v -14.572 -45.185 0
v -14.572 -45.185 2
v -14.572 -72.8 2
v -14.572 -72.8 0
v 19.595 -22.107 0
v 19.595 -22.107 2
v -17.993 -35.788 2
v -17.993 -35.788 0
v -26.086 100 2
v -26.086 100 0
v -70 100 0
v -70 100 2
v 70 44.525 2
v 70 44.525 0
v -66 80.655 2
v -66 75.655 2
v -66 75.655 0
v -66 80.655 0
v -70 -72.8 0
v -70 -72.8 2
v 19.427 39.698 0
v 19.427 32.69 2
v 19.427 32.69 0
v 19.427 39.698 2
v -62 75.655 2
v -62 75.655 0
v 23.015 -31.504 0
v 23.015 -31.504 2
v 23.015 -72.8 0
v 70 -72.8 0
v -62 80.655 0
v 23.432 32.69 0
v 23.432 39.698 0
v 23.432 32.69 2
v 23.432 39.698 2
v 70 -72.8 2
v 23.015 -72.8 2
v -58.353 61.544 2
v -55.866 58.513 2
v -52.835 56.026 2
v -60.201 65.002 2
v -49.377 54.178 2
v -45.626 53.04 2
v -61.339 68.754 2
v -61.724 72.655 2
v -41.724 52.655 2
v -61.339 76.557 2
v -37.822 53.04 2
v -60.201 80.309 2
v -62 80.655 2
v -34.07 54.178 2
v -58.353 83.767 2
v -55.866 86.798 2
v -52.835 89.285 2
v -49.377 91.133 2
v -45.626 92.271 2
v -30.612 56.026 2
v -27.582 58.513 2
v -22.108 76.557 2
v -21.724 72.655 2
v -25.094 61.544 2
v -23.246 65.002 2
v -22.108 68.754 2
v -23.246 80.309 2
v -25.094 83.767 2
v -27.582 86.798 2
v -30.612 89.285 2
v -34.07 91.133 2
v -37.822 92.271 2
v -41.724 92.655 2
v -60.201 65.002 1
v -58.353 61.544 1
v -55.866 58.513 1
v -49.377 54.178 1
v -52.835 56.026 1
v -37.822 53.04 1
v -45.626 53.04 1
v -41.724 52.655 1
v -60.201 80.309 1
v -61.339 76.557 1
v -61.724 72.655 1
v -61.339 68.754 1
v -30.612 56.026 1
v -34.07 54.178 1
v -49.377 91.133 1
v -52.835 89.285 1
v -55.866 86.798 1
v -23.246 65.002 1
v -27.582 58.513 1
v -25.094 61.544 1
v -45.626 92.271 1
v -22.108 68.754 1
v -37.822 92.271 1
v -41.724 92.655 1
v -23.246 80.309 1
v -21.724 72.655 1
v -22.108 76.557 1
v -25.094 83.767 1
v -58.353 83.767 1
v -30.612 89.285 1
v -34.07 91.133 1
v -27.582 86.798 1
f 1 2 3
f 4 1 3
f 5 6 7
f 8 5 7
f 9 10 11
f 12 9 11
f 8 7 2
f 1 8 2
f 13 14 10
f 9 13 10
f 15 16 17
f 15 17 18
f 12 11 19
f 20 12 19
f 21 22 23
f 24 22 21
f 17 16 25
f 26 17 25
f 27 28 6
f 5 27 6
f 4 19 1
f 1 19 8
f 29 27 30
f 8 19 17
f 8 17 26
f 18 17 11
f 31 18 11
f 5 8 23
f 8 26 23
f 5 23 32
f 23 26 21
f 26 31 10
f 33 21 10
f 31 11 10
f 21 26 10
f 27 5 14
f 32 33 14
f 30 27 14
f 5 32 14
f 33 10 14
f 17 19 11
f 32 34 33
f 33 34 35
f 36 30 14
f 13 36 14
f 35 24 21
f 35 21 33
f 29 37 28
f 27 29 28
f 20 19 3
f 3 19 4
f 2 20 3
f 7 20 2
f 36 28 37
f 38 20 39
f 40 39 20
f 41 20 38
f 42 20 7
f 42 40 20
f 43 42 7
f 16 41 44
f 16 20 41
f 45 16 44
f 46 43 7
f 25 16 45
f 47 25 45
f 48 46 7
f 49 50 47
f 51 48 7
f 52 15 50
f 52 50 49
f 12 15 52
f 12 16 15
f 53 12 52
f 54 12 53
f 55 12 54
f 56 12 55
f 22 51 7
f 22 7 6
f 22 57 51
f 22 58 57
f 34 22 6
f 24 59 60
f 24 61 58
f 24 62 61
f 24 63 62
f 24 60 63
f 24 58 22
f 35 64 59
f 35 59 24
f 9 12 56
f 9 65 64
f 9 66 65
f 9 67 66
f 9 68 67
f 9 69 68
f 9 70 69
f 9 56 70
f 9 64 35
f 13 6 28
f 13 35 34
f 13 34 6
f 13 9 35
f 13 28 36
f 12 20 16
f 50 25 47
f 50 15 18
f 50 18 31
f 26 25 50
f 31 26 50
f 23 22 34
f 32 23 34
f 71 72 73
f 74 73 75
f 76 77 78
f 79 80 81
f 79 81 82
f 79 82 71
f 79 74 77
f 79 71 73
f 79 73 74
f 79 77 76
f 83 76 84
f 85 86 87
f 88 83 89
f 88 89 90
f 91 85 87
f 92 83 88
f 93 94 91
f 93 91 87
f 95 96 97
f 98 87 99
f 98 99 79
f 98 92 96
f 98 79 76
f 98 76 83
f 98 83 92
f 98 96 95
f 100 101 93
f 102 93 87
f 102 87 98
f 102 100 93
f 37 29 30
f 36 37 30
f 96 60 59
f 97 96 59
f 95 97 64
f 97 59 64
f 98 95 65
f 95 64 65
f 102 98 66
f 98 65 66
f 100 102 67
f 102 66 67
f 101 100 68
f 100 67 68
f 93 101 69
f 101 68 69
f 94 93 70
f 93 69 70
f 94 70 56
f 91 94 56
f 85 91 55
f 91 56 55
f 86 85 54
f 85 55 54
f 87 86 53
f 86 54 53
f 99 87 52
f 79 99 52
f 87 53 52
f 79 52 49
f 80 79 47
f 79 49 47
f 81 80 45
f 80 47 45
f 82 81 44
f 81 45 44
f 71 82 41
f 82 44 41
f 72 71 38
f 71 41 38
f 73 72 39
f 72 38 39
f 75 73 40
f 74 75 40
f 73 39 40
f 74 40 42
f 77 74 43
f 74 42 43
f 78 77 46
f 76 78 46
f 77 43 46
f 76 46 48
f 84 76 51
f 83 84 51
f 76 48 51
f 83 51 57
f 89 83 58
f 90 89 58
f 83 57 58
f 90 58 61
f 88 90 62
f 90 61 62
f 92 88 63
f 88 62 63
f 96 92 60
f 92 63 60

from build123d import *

# Parameters (mm, degrees)
BOSS_EXTRUDE1_DEPTH = 2
SKETCH3_W           = 4.004504799
SKETCH3_H           = 7.007808652
SKETCH3_W_2         = 4
SKETCH3_H_2         = 5
CUT_EXTRUDE1_DEPTH  = 10
SKETCH4_R           = 20
CUT_EXTRUDE2_DEPTH  = 1


with BuildPart() as part:
    # Sketch1 → Boss-Extrude1 (new body)
    with BuildSketch(Plane.XY):
        Polygon((-70, 100), (-70, -72.799540117), (70, -72.799540117), (70, 44.524791386), (-26.08587988, 100), align=None)
    extrude(amount=BOSS_EXTRUDE1_DEPTH)

    # Sketch3 → Cut-Extrude1 (cut)
    with BuildSketch(Plane.XY.offset(2)):
        with Locations((21.429491924, 36.193920339)):
            Rectangle(SKETCH3_W, SKETCH3_H)
        with Locations((-64, 78.155444566)):
            Rectangle(SKETCH3_W_2, SKETCH3_H_2)
        Polygon((-14.572335871, -75.184527756), (23.015368961, -75.184527756), (23.015368961, -31.503722023), (19.595167527, -22.106795815), (-17.992537304, -35.787601548), (-14.572335871, -45.184527756), align=None)
    extrude(amount=-CUT_EXTRUDE1_DEPTH, mode=Mode.SUBTRACT)

    # Sketch4 → Cut-Extrude2 (cut)
    with BuildSketch(Plane.XY.offset(2)):
        with Locations((-41.723720558, 72.655444566)):
            Circle(SKETCH4_R)
    extrude(amount=-CUT_EXTRUDE2_DEPTH, mode=Mode.SUBTRACT)


solid = part.part
